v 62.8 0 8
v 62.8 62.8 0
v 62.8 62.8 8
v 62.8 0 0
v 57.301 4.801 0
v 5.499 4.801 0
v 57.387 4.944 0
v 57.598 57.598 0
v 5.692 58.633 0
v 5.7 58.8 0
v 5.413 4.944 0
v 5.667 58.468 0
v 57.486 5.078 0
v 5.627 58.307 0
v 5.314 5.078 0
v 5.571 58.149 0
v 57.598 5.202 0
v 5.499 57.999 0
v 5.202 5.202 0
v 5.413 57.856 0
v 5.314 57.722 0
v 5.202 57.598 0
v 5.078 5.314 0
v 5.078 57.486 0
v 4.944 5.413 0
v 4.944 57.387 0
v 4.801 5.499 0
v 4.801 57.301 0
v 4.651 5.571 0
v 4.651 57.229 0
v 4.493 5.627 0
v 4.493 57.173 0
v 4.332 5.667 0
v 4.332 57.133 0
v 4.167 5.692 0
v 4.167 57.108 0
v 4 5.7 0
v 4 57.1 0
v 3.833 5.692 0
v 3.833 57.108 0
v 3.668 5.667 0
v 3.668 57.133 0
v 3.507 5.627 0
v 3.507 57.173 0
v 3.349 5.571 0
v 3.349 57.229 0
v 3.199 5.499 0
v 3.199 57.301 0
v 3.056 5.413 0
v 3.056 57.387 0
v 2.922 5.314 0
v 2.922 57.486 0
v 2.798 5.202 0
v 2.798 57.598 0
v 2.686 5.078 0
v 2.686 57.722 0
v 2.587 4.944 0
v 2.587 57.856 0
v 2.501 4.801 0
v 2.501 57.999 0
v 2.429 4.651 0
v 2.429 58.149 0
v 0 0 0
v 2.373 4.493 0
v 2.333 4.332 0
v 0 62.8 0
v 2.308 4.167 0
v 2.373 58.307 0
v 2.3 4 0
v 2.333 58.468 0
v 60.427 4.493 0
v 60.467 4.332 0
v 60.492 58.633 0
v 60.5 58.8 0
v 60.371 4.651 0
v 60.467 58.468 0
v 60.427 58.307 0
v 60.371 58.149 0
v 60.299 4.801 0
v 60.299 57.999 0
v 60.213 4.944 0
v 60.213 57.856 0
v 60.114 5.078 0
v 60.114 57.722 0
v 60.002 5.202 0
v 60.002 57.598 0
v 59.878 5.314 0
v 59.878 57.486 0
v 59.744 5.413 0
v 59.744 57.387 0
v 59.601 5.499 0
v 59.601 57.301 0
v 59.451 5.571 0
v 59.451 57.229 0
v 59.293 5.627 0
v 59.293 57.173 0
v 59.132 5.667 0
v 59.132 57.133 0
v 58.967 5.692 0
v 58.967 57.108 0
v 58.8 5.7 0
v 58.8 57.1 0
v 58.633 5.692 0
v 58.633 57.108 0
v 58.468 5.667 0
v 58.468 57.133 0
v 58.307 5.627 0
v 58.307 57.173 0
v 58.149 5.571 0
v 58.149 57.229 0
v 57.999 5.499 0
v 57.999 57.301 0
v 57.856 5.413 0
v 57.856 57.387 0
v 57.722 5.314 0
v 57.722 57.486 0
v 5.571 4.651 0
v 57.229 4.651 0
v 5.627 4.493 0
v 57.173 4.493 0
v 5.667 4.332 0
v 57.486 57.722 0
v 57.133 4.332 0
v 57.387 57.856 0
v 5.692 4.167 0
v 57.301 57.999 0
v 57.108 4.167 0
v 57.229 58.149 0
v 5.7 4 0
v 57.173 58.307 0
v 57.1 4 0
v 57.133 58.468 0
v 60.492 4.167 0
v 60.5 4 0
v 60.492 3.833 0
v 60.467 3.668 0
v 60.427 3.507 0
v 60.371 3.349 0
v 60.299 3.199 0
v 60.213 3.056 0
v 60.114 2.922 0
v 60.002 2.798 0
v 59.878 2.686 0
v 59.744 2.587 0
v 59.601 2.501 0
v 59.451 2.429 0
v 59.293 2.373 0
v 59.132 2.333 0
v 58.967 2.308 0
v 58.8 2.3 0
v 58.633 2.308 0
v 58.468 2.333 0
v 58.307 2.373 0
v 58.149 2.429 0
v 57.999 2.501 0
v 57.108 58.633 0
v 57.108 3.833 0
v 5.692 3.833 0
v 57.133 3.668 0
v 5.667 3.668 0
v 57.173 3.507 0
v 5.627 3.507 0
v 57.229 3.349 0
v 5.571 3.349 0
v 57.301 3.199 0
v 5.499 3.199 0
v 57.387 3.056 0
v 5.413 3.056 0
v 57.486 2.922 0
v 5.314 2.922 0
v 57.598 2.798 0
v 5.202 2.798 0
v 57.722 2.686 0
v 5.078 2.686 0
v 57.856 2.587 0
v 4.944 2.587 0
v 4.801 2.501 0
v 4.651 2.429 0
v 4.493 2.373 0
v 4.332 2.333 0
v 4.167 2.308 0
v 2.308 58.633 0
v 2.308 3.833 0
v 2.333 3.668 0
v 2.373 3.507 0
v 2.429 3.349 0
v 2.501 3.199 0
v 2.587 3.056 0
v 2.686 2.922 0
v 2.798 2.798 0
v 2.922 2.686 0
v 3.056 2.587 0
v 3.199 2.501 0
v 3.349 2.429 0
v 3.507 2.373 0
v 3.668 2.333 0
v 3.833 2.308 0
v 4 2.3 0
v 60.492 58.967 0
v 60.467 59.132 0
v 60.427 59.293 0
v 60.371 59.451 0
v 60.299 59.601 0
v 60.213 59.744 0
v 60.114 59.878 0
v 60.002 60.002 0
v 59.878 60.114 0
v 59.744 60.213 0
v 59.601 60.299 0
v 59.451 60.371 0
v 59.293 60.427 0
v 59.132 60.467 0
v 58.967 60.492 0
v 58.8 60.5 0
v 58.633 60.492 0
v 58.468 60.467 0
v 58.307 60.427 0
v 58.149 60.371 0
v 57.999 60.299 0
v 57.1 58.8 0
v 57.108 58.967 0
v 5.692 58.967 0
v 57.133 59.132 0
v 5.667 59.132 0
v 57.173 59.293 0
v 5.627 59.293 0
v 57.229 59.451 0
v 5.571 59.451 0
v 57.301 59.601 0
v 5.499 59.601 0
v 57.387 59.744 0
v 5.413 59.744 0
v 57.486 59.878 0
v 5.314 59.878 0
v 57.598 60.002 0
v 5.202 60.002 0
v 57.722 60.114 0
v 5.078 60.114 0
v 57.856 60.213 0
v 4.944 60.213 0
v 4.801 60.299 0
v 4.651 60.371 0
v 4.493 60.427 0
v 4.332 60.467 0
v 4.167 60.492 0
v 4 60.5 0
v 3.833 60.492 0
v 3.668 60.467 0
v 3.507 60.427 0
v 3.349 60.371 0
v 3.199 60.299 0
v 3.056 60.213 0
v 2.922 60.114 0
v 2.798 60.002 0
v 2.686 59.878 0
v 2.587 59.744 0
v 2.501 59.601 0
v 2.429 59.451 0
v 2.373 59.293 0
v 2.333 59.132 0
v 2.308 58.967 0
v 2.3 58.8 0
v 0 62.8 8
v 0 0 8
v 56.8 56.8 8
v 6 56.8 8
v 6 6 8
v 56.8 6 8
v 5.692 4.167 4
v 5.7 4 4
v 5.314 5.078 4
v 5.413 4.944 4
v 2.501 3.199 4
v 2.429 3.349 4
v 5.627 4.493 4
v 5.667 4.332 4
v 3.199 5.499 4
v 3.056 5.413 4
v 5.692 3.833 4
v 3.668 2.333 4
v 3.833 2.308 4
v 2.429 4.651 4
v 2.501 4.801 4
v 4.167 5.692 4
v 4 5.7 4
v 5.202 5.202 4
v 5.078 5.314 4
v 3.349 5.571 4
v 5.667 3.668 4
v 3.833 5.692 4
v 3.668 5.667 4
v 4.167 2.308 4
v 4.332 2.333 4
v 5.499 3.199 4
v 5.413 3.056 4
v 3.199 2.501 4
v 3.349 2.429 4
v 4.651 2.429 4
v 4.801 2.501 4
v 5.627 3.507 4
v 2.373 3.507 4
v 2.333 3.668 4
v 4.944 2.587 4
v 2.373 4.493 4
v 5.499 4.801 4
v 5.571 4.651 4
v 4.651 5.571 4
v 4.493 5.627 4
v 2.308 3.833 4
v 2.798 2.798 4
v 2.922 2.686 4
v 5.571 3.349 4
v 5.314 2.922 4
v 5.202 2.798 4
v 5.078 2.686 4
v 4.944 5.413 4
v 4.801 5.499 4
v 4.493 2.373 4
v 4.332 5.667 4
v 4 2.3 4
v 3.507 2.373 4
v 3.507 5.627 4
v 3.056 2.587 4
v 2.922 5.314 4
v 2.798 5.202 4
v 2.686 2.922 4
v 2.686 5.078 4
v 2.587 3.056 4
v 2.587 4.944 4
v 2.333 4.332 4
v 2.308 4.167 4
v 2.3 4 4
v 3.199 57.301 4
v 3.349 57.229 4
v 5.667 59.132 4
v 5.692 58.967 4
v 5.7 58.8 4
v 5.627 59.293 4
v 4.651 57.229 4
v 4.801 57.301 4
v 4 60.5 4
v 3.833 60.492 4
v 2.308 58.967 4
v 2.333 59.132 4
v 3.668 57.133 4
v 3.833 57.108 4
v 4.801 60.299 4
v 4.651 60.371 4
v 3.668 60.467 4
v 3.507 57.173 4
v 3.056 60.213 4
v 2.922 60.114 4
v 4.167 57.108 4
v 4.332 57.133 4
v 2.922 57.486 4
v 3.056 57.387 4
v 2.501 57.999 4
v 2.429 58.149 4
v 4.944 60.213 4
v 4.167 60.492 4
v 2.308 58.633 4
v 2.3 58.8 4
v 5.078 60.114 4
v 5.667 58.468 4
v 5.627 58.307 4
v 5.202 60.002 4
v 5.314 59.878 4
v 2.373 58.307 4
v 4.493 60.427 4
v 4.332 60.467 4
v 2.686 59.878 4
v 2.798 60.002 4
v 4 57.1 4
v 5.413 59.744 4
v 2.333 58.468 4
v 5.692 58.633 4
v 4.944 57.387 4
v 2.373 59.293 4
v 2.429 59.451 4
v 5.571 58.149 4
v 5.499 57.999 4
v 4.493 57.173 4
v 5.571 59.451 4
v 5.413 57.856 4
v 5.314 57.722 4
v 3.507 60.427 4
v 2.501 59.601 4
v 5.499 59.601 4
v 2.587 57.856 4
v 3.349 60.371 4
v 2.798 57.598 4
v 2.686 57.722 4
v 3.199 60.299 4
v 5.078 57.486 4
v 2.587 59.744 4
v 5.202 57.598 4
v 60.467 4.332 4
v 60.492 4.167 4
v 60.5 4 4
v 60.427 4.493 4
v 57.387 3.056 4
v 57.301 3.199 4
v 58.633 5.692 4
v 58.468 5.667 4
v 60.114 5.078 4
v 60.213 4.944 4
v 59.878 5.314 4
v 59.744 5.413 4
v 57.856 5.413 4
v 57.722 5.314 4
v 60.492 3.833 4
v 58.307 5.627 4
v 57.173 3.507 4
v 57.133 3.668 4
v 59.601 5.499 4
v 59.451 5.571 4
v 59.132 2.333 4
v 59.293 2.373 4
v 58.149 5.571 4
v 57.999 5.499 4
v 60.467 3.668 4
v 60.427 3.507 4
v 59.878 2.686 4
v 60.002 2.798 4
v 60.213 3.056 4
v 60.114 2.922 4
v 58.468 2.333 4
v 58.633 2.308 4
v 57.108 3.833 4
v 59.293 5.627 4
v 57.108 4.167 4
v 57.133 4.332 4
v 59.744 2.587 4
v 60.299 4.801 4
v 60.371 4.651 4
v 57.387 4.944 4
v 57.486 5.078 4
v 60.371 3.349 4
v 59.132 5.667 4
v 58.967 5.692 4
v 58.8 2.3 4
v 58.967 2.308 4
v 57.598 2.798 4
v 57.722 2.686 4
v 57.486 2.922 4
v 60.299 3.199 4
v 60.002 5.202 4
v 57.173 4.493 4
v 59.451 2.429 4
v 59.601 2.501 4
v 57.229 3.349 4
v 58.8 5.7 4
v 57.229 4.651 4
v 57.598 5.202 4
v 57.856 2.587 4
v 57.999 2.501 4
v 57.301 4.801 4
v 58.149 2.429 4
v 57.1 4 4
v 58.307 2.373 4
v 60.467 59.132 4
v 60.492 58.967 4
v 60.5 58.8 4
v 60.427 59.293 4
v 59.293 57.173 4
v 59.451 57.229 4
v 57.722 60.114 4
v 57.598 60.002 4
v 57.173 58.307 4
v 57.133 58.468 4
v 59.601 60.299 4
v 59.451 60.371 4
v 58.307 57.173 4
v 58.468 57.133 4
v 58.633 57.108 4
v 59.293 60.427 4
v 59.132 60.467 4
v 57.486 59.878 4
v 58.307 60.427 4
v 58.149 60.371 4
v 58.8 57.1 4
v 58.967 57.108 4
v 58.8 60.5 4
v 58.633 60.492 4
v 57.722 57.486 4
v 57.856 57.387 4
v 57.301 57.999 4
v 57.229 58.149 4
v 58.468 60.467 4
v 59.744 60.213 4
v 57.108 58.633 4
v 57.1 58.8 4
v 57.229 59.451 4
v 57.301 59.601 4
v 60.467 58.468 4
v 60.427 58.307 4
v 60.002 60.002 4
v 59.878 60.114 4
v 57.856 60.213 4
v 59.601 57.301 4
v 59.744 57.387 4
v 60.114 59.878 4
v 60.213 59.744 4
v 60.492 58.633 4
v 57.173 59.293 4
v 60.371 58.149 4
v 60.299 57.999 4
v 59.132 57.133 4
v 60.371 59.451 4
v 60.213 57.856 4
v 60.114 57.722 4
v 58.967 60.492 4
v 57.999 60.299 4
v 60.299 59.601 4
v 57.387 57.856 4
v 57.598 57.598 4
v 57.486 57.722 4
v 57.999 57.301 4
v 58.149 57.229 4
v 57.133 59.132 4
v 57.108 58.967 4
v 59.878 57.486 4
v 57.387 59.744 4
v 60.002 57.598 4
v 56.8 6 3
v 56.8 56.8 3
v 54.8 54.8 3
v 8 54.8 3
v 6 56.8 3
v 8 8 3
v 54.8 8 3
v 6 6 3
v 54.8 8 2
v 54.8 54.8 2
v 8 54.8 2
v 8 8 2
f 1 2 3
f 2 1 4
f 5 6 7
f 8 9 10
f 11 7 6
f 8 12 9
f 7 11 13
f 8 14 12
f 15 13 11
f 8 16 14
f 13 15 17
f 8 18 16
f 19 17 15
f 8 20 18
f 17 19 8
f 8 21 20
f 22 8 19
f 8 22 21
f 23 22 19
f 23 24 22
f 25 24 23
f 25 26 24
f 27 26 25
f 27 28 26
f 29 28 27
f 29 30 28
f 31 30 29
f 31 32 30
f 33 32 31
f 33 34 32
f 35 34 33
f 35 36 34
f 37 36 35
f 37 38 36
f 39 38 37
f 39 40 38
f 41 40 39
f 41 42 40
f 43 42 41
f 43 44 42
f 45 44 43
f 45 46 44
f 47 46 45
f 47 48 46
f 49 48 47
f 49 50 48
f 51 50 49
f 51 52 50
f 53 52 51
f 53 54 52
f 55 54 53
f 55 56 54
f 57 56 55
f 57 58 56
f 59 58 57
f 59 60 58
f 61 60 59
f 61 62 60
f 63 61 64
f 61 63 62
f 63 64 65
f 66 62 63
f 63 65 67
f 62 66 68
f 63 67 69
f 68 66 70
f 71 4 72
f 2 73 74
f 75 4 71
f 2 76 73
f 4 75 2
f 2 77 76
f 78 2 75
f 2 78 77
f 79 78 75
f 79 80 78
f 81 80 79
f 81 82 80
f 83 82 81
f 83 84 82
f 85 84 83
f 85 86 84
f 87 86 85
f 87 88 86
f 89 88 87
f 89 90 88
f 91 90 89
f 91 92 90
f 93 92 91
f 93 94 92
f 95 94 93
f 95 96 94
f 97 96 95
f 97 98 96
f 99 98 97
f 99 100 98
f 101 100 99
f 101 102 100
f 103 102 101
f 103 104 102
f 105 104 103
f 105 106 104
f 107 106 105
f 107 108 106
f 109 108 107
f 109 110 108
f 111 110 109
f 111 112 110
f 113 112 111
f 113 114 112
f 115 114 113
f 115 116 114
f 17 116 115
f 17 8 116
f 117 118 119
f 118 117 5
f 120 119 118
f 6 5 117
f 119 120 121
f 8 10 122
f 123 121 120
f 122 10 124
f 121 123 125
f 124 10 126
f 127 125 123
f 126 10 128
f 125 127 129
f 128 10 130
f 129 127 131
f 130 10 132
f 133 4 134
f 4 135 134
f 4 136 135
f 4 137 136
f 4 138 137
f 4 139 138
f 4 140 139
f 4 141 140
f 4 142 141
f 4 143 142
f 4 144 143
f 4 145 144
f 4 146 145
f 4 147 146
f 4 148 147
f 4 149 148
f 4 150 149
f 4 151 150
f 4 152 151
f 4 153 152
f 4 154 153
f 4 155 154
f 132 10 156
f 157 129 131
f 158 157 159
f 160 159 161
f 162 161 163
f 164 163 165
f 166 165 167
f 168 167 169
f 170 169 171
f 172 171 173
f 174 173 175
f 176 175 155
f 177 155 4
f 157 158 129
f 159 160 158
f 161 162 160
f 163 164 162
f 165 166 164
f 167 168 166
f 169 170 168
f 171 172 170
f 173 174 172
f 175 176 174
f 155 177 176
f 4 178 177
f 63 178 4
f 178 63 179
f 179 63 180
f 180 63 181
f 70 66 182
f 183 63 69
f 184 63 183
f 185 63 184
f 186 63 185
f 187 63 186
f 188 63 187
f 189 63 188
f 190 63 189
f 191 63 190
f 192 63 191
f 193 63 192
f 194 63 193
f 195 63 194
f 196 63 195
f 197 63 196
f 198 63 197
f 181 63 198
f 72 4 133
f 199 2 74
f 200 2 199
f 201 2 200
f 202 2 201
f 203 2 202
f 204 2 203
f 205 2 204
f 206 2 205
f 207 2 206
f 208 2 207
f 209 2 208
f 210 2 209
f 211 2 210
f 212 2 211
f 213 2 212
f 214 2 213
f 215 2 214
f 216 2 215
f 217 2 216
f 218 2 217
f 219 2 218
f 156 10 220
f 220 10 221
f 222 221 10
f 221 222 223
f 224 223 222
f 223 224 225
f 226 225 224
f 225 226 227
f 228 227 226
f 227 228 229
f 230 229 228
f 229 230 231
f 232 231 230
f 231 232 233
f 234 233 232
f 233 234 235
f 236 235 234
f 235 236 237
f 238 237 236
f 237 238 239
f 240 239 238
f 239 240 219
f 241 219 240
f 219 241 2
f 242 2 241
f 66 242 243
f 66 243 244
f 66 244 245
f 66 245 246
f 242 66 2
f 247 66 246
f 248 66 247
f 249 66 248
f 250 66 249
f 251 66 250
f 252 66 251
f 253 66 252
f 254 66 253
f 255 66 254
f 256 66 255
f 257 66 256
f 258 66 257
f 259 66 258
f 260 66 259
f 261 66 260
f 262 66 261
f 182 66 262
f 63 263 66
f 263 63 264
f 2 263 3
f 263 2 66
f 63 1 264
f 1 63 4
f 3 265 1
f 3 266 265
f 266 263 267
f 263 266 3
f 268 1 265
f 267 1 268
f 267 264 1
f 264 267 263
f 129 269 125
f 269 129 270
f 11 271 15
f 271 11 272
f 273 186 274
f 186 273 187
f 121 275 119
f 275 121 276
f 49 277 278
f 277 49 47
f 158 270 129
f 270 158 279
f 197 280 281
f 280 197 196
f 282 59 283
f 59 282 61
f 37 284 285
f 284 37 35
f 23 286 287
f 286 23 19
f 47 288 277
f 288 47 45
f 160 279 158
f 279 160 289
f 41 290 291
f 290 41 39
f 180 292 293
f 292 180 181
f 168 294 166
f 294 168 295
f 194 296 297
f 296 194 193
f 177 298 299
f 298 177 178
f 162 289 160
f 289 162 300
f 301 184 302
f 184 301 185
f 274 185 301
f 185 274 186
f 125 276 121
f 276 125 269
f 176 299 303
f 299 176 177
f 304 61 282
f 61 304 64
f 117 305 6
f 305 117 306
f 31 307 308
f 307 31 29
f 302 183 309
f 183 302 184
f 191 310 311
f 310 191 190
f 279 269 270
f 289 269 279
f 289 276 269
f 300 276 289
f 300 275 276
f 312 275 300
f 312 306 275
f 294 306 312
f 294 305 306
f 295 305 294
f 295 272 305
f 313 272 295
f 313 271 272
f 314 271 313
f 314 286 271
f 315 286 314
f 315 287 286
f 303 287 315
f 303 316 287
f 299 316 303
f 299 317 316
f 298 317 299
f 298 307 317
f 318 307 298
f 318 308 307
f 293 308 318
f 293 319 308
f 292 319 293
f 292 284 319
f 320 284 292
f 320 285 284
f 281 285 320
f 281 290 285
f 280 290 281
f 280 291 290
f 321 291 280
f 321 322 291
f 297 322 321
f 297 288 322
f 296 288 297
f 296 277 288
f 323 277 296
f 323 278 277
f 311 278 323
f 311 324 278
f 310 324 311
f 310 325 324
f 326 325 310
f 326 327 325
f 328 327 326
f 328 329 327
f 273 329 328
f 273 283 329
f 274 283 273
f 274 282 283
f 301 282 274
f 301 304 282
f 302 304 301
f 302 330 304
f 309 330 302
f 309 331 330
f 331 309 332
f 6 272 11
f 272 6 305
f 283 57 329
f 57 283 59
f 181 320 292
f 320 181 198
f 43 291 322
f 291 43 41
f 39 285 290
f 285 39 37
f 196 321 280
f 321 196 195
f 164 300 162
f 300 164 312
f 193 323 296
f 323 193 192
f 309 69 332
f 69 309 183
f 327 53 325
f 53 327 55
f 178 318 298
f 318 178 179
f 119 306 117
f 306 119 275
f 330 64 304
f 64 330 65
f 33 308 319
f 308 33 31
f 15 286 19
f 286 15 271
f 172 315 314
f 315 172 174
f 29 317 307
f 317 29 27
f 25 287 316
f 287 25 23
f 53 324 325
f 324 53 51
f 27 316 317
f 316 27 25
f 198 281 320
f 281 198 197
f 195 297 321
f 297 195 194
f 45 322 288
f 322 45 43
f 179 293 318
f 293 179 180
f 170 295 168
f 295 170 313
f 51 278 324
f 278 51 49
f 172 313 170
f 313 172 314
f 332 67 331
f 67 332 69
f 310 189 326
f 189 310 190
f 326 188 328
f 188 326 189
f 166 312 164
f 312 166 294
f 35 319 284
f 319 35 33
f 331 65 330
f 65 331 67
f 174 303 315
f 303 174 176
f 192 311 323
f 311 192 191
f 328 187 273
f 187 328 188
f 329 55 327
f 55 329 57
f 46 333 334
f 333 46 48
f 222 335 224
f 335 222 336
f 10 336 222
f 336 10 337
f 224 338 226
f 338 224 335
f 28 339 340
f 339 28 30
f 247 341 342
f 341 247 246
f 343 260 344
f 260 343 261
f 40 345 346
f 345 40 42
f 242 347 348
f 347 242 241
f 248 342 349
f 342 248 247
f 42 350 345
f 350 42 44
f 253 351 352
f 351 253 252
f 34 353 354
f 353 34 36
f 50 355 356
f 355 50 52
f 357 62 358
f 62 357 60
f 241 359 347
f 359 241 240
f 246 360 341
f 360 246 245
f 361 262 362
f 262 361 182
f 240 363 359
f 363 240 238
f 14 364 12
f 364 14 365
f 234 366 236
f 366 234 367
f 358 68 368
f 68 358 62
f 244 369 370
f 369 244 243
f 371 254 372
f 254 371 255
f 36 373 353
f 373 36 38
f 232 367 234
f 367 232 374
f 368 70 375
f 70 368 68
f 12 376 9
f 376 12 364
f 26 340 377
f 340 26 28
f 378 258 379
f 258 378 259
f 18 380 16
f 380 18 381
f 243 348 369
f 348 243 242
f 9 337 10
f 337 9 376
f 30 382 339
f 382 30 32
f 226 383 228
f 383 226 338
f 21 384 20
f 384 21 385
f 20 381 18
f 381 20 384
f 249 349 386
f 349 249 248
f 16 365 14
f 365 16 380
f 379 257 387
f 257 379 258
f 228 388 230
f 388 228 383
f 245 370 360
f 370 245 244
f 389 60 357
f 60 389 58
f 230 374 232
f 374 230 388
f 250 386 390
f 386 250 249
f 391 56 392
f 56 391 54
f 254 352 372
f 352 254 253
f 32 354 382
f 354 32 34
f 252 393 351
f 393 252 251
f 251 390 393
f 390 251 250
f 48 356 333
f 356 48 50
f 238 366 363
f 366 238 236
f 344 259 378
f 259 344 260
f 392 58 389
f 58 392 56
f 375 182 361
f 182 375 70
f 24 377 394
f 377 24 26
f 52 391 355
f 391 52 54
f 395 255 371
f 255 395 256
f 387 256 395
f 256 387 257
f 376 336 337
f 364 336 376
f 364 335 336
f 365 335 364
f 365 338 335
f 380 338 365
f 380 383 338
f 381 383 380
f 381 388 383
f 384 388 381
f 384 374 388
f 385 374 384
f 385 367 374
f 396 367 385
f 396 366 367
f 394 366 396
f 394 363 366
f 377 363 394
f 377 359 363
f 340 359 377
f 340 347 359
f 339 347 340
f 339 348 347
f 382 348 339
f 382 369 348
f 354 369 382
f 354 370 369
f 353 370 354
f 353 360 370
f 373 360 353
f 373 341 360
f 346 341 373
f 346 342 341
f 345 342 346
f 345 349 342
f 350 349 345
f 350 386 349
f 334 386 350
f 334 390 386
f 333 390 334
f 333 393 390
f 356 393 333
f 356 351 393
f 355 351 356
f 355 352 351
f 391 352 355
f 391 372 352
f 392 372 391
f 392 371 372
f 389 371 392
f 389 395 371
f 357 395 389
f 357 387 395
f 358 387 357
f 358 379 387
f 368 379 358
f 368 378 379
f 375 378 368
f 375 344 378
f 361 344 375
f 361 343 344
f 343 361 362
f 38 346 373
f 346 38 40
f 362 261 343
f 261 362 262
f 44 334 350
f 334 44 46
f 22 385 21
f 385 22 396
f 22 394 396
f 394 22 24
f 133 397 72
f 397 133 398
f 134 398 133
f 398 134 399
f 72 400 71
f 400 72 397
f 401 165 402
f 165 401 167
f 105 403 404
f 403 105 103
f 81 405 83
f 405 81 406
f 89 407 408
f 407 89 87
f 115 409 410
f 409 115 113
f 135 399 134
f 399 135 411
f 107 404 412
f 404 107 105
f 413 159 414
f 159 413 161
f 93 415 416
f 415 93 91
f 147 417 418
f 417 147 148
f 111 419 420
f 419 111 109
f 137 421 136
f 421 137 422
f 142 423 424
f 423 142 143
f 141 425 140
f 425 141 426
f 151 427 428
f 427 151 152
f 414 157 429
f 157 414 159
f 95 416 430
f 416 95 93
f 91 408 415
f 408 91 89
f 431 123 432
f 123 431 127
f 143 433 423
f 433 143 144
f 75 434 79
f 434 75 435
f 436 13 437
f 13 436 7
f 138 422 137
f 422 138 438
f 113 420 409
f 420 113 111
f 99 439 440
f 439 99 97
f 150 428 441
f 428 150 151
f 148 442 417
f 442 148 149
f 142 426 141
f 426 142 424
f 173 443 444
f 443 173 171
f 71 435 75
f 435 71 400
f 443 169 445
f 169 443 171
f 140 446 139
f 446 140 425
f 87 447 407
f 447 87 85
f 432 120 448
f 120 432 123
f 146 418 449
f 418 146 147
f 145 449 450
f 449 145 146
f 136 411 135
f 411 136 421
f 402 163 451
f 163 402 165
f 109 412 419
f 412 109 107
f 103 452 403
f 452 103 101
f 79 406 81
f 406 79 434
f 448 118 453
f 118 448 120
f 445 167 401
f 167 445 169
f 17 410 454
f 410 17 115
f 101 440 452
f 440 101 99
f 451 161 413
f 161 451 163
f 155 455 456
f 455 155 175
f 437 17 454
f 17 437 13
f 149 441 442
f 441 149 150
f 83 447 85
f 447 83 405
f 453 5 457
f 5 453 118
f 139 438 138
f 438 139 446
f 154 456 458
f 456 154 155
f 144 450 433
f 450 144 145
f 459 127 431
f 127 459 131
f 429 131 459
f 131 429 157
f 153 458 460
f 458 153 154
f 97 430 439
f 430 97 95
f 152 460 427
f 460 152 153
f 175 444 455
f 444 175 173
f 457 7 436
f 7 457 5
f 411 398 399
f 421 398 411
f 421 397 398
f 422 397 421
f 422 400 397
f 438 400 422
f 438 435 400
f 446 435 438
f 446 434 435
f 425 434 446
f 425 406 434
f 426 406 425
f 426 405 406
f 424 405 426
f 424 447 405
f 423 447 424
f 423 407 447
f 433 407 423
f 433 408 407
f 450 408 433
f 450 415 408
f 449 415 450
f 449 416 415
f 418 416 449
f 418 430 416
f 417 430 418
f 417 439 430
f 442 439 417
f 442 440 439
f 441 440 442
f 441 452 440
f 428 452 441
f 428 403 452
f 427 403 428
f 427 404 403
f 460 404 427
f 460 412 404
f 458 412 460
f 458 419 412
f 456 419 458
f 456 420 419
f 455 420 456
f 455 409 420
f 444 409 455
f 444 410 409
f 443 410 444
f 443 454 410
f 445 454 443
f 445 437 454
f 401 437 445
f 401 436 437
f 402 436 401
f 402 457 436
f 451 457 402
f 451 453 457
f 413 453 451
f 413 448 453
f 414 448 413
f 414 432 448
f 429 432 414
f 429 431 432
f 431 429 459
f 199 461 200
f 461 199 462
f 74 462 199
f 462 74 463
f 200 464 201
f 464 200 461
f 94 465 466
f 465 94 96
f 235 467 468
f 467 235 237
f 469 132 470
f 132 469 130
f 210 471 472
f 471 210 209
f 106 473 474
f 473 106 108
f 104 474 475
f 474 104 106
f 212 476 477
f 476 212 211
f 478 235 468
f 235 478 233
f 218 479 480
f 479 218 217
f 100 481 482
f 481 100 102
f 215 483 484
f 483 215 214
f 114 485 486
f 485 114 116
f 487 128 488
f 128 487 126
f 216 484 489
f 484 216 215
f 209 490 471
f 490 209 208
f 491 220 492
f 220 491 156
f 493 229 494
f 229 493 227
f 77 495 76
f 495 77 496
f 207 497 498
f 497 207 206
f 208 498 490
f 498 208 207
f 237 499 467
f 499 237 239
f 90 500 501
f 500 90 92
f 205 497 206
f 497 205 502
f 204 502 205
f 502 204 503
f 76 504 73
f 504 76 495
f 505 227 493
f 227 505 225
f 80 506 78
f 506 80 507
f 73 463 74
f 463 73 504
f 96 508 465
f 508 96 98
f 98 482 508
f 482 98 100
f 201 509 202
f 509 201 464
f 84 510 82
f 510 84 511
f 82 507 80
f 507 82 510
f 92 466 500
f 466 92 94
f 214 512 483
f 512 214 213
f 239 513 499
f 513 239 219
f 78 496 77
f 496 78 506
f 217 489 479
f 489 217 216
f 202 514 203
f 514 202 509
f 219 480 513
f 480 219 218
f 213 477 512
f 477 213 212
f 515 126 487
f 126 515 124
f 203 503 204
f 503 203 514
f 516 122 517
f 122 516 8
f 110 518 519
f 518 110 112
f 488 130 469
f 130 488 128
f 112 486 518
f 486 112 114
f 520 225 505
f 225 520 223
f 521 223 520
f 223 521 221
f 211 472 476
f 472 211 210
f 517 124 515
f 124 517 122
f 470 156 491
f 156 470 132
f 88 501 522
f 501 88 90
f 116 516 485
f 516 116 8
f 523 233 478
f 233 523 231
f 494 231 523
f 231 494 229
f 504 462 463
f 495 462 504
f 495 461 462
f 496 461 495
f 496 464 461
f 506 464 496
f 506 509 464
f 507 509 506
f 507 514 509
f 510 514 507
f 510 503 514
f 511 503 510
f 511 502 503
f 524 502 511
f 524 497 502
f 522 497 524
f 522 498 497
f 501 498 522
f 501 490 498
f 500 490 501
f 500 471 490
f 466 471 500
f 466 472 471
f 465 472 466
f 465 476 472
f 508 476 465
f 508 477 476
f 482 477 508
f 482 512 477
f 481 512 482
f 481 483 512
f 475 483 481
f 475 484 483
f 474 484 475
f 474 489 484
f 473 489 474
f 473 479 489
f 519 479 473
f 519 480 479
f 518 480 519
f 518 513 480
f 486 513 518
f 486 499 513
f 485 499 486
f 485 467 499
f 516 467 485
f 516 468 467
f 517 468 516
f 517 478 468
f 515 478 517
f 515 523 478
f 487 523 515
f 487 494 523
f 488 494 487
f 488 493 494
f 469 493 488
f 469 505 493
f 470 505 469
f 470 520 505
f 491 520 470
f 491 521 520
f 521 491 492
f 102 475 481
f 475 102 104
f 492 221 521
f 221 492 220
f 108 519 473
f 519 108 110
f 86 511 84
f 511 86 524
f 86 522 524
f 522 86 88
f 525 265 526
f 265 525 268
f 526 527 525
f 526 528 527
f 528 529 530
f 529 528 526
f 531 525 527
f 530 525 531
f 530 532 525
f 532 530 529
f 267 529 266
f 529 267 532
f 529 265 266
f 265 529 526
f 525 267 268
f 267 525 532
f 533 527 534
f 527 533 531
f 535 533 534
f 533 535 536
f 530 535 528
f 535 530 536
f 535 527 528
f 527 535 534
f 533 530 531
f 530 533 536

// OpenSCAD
// J2 shared isolation-rig coupon geometry. Units: mm. OpenSCAD, no libraries.
//
// This file is a *fixture* for the J2 isolation protocol, not a display cell.
// It is deliberately architecture-agnostic: the tile holder accepts an
// interchangeable drive fixture with the same four M3 bolt pattern.
//
// Exported geometry is not a printer or material qualification. Print on the
// X1C/PLA process, inspect sliced walls, and record slicer settings per the
// project fabrication baseline in 02-design-criteria.
//
// PRINT BASELINE (Bambu X1C, PLA, 0.4 mm nozzle) -- proposed, not yet verified:
//   layer 0.20 mm; walls 3 perimeters; top/bottom 5 layers; 15% gyroid infill.
//   holder + miniature_tray + indicator_bracket: print as laid out below, no
//     supports (all overhangs <= 45 deg by construction).
//   base_rail: prints flat; 12 mm thick, split if the slicer bed allows.
//   Do NOT scale tile/cell_pitch_mm: the whole point is full-scale pitch.
//
// Print the parts on ONE plate with `part = "plate"`. Individual STL export:
//   openscad -o holder_10x10.stl -D tile=10 j2_isolation_rig.scad
//   openscad -o base_rail.stl     -D part=\"base_rail\" j2_isolation_rig.scad
//   openscad -o plate.stl         -D part=\"plate\" j2_isolation_rig.scad
//
// See `isolation_rig_protocol.md` for the bite-by-bite build/measurement plan
// and `isolation_rig_runner.py` for the pass/fail gate engine fed by results.

// ------------------------- user parameters -----------------------------------
// tile cells per side: 5, 10 or 20 (the three protocol sweep points)
tile = 10;
// full-scale cell pitch. Do not scale this down.
cell_pitch_mm = 5.08;
// nominal seam between the two tile holders
seam_gap_mm = 0.40;
// holder border wall around the active cell field
border_mm = 6.0;
// holder base thickness
base_thickness_mm = 3.0;
// holder side wall height (keeps the tile registered; not a load surface)
wall_height_mm = 8.0;
// M3 clearance hole diameter and bolt pattern inset from each corner
m3_clearance_mm = 3.4;
bolt_inset_mm = 4.0;
// print clearance for self-tapping M3 into the rail (tap pilot)
m3_pilot_mm = 2.7;
// edge chamfer to fight first-layer elephant-foot (bowtie) at the seam face
chamfer_mm = 0.6;
// interchangeable-fixture socket cut into the holder floor (J2 protocol).
// The socket is open from the underside so each survivor's drive fixture drops
// in flush with the active field. socket_floor_mm of solid floor is left for
// stiffness; must stay < base_thickness_mm so the pocket is actually open.
socket_inset_mm = 2.0;    // socket side inset from the active field edge
socket_depth_mm = 1.0;    // pocket depth up from the holder underside

part = "holder";        // holder | base_rail | indicator_bracket | miniature_tray | plate
$fn = 64;

active_mm = tile * cell_pitch_mm;
outer_mm = active_mm + 2 * border_mm;

// ------------------------- holders -------------------------------------------
module m3_holes() {
    for (dx = [bolt_inset_mm, outer_mm - bolt_inset_mm])
        for (dy = [bolt_inset_mm, outer_mm - bolt_inset_mm])
            translate([dx, dy, -1]) cylinder(d = m3_clearance_mm, h = base_thickness_mm + 2);
}

module holder() {
    // ONE manifold solid: a registration ring (open active field) fused to a thin
    // floor that carries the interchangeable-fixture socket. The previous revision
    // laid the floor *inside* the frame's solid bottom, so the socket pocket was
    // buried in plastic and the export was two overlapping volumes (a slicer
    // artifact). The floor now sits at the very bottom and the socket is a real,
    // open pocket machined into its underside.
    //
    // z = 0                .. base_thickness_mm      : floor slab (whole footprint)
    // z = base_thickness_mm.. wall_height_mm          : ring only (active field open)
    // socket: rectangular pocket in the floor underside, socket_depth below the
    //         floor top, so a drive fixture plate drops in flush with the field.
    difference() {
        union() {
            cube([outer_mm, outer_mm, base_thickness_mm]);
            translate([0, 0, base_thickness_mm])
                cube([outer_mm, outer_mm, wall_height_mm - base_thickness_mm]);
        }
        // active field: open through the ring, down to the floor top
        translate([border_mm, border_mm, base_thickness_mm])
            cube([active_mm, active_mm, wall_height_mm]);
        // interchangeable-fixture socket: shallow recess in the floor TOP, open
        // upward, so the survivor's drive fixture drops in flush with the field.
        // Cutting from the top (not the underside) avoids a wide internal bridge
        // and keeps the part a clean single-sided print.
        translate([border_mm + socket_inset_mm, border_mm + socket_inset_mm,
                   base_thickness_mm - socket_depth_mm])
            cube([active_mm - 2 * socket_inset_mm, active_mm - 2 * socket_inset_mm,
                  socket_depth_mm + 1]);
        m3_holes();
    }
}

// ------------------------- shared base rail ----------------------------------
rail_length_mm = 2 * outer_mm + seam_gap_mm + 20;
rail_width_mm = outer_mm + 8;
rail_thickness_mm = 12;

module base_rail() {
    difference() {
        cube([rail_length_mm, rail_width_mm, rail_thickness_mm]);
        // two sets of holder bolt slots, separated by seam_gap_mm
        for (i = [0:1]) {
            x0 = 10 + i * (outer_mm + seam_gap_mm);
            for (dx = [bolt_inset_mm, outer_mm - bolt_inset_mm])
                for (dy = [4 + bolt_inset_mm, 4 + outer_mm - bolt_inset_mm])
                    translate([x0 + dx, dy, -1]) cylinder(d = m3_clearance_mm, h = rail_thickness_mm + 2);
        }
    }
}

// ------------------------- dial indicator bracket ----------------------------
// Clamps a 0.01 mm dial indicator so its probe can sit on the neighbour tile.
bracket_stem_d_mm = 8.0;   // typical indicator stem
module indicator_bracket() {
    difference() {
        union() {
            cube([24, 24, 4]);
            translate([4, 4, 4]) cube([16, 16, 14]);
        }
        translate([12, 12, 8]) rotate([90, 0, 0])
            cylinder(d = bracket_stem_d_mm + 0.2, h = 20, center = true);
        translate([12, 12, -1]) cylinder(d = m3_clearance_mm, h = 6);
    }
}

// ------------------------- miniature tray ------------------------------------
// A shallow tray so a real miniature base can be centred on the neighbour tile
// and its movement/tipping scored against a fixed datum.
min_base_mm = 25.4;   // one battle-map square
module miniature_tray() {
    difference() {
        cube([min_base_mm + 4, min_base_mm + 4, 3]);
        translate([2, 2, 1]) cube([min_base_mm, min_base_mm, 3]);
    }
}

// ------------------------- print plate layout --------------------------------
// Lays the whole J2 set on one X1C bed (256 x 256) with 6 mm part gaps and no
// supports. Big tiles (20x20) exceed the bed in one piece: print those halves
// separately and bolt on the printed splice per the protocol.
module print_plate() {
    gap = 6.0;
    // two holders side by side (the pair under test)
    translate([0, 0, 0]) holder();
    translate([outer_mm + gap, 0, 0]) holder();
    // miniature trays below the holders
    translate([0, outer_mm + gap, 0]) miniature_tray();
    translate([min_base_mm + 4 + gap, outer_mm + gap, 0]) miniature_tray();
    // two indicator brackets
    translate([0, outer_mm + gap + min_base_mm + 4 + gap, 0])
        indicator_bracket();
    translate([24 + gap, outer_mm + gap + min_base_mm + 4 + gap, 0])
        indicator_bracket();
}

// ------------------------- dispatch ------------------------------------------
if (part == "holder") holder();
else if (part == "base_rail") base_rail();
else if (part == "indicator_bracket") indicator_bracket();
else if (part == "miniature_tray") miniature_tray();
else if (part == "plate") print_plate();
else holder();
